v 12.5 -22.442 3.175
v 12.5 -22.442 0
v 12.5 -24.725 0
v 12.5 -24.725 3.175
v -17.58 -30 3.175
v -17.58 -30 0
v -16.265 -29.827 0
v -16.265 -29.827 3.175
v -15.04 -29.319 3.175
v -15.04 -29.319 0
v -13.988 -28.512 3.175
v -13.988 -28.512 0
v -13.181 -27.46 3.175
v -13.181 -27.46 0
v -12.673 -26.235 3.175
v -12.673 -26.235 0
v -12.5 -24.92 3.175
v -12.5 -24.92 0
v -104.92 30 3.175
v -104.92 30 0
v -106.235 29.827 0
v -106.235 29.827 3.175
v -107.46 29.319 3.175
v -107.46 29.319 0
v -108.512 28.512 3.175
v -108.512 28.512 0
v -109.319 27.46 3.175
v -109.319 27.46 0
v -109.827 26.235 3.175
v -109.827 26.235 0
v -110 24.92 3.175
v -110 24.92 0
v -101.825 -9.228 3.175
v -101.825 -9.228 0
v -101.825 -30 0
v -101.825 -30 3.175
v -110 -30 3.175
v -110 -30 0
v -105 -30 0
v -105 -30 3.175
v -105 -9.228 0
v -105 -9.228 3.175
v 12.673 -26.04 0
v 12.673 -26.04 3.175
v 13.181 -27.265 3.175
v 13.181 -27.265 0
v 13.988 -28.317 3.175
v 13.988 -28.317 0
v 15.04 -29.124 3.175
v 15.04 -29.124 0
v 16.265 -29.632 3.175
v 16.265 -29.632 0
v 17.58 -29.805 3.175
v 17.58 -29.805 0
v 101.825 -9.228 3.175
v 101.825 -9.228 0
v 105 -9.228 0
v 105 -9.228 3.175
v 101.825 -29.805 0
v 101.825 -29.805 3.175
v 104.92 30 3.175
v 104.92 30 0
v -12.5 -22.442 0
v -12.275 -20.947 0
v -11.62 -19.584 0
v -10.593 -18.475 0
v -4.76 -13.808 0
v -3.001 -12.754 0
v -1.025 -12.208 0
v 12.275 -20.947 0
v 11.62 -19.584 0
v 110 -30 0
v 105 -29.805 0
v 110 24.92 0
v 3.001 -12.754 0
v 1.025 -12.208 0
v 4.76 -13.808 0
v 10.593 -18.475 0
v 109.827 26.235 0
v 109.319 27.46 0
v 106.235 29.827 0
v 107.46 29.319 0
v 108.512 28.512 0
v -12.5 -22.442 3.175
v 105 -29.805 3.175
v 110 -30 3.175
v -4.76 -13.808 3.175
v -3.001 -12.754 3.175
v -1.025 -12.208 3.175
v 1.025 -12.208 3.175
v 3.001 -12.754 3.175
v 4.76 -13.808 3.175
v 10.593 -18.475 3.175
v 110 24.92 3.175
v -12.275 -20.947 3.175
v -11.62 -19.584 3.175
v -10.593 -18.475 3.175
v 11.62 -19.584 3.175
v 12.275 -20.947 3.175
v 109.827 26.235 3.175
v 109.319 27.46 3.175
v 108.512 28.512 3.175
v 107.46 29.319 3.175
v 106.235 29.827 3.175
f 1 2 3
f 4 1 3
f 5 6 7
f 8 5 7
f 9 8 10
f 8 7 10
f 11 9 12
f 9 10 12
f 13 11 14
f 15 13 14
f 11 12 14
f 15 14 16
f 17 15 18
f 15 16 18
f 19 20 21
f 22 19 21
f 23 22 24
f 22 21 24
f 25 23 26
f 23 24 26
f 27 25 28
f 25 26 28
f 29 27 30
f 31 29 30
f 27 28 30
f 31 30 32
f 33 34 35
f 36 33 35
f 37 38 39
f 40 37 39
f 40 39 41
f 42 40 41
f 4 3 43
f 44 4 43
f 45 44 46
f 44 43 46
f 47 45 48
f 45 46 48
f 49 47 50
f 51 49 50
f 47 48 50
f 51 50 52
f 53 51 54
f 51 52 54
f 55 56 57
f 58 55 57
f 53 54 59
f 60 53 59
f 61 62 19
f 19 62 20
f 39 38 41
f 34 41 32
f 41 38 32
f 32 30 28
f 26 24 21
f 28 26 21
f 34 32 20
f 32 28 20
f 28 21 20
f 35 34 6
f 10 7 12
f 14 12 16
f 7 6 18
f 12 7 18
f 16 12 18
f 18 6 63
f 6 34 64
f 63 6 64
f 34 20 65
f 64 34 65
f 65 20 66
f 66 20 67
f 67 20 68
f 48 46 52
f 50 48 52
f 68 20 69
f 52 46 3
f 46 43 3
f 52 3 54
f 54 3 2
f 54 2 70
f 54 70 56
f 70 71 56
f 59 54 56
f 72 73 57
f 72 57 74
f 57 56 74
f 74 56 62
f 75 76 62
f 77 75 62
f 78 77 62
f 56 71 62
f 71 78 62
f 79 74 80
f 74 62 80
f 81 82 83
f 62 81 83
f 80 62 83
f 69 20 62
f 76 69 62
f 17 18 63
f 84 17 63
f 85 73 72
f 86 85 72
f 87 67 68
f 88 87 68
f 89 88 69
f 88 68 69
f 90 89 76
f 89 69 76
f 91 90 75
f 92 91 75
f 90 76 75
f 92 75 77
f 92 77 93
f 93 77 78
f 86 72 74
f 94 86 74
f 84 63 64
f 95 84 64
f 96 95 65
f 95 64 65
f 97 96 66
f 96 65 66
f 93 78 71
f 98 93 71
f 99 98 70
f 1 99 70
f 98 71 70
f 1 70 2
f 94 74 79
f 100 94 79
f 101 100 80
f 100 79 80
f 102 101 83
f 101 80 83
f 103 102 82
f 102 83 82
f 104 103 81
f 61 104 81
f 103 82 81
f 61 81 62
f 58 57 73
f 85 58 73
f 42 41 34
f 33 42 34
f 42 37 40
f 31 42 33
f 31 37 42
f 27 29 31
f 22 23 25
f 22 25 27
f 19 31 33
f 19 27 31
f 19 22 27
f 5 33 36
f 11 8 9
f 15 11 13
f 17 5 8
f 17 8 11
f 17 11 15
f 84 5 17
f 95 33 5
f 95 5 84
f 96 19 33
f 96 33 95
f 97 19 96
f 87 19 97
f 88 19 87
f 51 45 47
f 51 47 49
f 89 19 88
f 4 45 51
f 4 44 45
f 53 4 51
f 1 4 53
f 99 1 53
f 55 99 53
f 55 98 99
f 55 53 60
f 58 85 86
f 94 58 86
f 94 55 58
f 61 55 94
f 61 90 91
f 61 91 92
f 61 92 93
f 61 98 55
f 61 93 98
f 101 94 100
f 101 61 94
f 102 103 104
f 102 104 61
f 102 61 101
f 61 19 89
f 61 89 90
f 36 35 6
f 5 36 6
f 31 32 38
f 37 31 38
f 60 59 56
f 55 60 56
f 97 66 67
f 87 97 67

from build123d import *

# Parameters (mm, degrees)
F1_DEPTH = 3.175


# Not quite as in the source:
# - a length typed as a fraction of an inch, garbled in the dataset ("3 / 203.2 mm" for 3/8 in), is restored


with BuildPart() as f1:
    # F0 (on Top) → F1 (new body)
    with BuildSketch(Plane.XY):
        with BuildLine():
            ThreePointArc((110, 24.92), (108.5121024484, 28.5121024484), (104.92, 30))
            Line((104.92, 30), (-104.92, 30))
            ThreePointArc((-104.92, 30), (-108.5121024484, 28.5121024484), (-110, 24.92))
            Line((-110, 24.92), (-110, -30))
            Line((-110, -30), (-105, -30))
            Line((-105, -30), (-105, -9.2280227691))
            Line((-105, -9.2280227691), (-101.825, -9.2280227691))
            Line((-101.825, -9.2280227691), (-101.825, -30))
            Line((-101.825, -30), (-17.58, -30))
            ThreePointArc((-17.58, -30), (-13.9878975516, -28.5121024484), (-12.5, -24.92))
            Line((-12.5, -24.92), (-12.5, -22.4415742252))
            ThreePointArc((-12.5, -22.4415742252), (-11.9986204404, -20.2409754743), (-10.5934508416, -18.4747606733))
            Line((-10.5934508416, -18.4747606733), (-4.7601762624, -13.8081410099))
            ThreePointArc((-4.7601762624, -13.8081410099), (0, -12.1383613378), (4.7601762624, -13.8081410099))
            Line((4.7601762624, -13.8081410099), (10.5934508416, -18.4747606733))
            ThreePointArc((10.5934508416, -18.4747606733), (11.9986204404, -20.2409754743), (12.5, -22.4415742252))
            Line((12.5, -22.4415742252), (12.5, -24.7250270788))
            ThreePointArc((12.5, -24.7250270788), (13.9878975516, -28.3171295272), (17.58, -29.8050270788))
            Line((17.58, -29.8050270788), (101.825, -29.8050270788))
            Line((101.825, -29.8050270788), (101.825, -9.2280227691))
            Line((101.825, -9.2280227691), (105, -9.2280227691))
            Line((105, -9.2280227691), (105, -29.8050270788))
            Line((105, -29.8050270788), (110, -30))
            Line((110, -30), (110, 24.92))
        make_face()
    extrude(amount=F1_DEPTH)


solid = f1.part
